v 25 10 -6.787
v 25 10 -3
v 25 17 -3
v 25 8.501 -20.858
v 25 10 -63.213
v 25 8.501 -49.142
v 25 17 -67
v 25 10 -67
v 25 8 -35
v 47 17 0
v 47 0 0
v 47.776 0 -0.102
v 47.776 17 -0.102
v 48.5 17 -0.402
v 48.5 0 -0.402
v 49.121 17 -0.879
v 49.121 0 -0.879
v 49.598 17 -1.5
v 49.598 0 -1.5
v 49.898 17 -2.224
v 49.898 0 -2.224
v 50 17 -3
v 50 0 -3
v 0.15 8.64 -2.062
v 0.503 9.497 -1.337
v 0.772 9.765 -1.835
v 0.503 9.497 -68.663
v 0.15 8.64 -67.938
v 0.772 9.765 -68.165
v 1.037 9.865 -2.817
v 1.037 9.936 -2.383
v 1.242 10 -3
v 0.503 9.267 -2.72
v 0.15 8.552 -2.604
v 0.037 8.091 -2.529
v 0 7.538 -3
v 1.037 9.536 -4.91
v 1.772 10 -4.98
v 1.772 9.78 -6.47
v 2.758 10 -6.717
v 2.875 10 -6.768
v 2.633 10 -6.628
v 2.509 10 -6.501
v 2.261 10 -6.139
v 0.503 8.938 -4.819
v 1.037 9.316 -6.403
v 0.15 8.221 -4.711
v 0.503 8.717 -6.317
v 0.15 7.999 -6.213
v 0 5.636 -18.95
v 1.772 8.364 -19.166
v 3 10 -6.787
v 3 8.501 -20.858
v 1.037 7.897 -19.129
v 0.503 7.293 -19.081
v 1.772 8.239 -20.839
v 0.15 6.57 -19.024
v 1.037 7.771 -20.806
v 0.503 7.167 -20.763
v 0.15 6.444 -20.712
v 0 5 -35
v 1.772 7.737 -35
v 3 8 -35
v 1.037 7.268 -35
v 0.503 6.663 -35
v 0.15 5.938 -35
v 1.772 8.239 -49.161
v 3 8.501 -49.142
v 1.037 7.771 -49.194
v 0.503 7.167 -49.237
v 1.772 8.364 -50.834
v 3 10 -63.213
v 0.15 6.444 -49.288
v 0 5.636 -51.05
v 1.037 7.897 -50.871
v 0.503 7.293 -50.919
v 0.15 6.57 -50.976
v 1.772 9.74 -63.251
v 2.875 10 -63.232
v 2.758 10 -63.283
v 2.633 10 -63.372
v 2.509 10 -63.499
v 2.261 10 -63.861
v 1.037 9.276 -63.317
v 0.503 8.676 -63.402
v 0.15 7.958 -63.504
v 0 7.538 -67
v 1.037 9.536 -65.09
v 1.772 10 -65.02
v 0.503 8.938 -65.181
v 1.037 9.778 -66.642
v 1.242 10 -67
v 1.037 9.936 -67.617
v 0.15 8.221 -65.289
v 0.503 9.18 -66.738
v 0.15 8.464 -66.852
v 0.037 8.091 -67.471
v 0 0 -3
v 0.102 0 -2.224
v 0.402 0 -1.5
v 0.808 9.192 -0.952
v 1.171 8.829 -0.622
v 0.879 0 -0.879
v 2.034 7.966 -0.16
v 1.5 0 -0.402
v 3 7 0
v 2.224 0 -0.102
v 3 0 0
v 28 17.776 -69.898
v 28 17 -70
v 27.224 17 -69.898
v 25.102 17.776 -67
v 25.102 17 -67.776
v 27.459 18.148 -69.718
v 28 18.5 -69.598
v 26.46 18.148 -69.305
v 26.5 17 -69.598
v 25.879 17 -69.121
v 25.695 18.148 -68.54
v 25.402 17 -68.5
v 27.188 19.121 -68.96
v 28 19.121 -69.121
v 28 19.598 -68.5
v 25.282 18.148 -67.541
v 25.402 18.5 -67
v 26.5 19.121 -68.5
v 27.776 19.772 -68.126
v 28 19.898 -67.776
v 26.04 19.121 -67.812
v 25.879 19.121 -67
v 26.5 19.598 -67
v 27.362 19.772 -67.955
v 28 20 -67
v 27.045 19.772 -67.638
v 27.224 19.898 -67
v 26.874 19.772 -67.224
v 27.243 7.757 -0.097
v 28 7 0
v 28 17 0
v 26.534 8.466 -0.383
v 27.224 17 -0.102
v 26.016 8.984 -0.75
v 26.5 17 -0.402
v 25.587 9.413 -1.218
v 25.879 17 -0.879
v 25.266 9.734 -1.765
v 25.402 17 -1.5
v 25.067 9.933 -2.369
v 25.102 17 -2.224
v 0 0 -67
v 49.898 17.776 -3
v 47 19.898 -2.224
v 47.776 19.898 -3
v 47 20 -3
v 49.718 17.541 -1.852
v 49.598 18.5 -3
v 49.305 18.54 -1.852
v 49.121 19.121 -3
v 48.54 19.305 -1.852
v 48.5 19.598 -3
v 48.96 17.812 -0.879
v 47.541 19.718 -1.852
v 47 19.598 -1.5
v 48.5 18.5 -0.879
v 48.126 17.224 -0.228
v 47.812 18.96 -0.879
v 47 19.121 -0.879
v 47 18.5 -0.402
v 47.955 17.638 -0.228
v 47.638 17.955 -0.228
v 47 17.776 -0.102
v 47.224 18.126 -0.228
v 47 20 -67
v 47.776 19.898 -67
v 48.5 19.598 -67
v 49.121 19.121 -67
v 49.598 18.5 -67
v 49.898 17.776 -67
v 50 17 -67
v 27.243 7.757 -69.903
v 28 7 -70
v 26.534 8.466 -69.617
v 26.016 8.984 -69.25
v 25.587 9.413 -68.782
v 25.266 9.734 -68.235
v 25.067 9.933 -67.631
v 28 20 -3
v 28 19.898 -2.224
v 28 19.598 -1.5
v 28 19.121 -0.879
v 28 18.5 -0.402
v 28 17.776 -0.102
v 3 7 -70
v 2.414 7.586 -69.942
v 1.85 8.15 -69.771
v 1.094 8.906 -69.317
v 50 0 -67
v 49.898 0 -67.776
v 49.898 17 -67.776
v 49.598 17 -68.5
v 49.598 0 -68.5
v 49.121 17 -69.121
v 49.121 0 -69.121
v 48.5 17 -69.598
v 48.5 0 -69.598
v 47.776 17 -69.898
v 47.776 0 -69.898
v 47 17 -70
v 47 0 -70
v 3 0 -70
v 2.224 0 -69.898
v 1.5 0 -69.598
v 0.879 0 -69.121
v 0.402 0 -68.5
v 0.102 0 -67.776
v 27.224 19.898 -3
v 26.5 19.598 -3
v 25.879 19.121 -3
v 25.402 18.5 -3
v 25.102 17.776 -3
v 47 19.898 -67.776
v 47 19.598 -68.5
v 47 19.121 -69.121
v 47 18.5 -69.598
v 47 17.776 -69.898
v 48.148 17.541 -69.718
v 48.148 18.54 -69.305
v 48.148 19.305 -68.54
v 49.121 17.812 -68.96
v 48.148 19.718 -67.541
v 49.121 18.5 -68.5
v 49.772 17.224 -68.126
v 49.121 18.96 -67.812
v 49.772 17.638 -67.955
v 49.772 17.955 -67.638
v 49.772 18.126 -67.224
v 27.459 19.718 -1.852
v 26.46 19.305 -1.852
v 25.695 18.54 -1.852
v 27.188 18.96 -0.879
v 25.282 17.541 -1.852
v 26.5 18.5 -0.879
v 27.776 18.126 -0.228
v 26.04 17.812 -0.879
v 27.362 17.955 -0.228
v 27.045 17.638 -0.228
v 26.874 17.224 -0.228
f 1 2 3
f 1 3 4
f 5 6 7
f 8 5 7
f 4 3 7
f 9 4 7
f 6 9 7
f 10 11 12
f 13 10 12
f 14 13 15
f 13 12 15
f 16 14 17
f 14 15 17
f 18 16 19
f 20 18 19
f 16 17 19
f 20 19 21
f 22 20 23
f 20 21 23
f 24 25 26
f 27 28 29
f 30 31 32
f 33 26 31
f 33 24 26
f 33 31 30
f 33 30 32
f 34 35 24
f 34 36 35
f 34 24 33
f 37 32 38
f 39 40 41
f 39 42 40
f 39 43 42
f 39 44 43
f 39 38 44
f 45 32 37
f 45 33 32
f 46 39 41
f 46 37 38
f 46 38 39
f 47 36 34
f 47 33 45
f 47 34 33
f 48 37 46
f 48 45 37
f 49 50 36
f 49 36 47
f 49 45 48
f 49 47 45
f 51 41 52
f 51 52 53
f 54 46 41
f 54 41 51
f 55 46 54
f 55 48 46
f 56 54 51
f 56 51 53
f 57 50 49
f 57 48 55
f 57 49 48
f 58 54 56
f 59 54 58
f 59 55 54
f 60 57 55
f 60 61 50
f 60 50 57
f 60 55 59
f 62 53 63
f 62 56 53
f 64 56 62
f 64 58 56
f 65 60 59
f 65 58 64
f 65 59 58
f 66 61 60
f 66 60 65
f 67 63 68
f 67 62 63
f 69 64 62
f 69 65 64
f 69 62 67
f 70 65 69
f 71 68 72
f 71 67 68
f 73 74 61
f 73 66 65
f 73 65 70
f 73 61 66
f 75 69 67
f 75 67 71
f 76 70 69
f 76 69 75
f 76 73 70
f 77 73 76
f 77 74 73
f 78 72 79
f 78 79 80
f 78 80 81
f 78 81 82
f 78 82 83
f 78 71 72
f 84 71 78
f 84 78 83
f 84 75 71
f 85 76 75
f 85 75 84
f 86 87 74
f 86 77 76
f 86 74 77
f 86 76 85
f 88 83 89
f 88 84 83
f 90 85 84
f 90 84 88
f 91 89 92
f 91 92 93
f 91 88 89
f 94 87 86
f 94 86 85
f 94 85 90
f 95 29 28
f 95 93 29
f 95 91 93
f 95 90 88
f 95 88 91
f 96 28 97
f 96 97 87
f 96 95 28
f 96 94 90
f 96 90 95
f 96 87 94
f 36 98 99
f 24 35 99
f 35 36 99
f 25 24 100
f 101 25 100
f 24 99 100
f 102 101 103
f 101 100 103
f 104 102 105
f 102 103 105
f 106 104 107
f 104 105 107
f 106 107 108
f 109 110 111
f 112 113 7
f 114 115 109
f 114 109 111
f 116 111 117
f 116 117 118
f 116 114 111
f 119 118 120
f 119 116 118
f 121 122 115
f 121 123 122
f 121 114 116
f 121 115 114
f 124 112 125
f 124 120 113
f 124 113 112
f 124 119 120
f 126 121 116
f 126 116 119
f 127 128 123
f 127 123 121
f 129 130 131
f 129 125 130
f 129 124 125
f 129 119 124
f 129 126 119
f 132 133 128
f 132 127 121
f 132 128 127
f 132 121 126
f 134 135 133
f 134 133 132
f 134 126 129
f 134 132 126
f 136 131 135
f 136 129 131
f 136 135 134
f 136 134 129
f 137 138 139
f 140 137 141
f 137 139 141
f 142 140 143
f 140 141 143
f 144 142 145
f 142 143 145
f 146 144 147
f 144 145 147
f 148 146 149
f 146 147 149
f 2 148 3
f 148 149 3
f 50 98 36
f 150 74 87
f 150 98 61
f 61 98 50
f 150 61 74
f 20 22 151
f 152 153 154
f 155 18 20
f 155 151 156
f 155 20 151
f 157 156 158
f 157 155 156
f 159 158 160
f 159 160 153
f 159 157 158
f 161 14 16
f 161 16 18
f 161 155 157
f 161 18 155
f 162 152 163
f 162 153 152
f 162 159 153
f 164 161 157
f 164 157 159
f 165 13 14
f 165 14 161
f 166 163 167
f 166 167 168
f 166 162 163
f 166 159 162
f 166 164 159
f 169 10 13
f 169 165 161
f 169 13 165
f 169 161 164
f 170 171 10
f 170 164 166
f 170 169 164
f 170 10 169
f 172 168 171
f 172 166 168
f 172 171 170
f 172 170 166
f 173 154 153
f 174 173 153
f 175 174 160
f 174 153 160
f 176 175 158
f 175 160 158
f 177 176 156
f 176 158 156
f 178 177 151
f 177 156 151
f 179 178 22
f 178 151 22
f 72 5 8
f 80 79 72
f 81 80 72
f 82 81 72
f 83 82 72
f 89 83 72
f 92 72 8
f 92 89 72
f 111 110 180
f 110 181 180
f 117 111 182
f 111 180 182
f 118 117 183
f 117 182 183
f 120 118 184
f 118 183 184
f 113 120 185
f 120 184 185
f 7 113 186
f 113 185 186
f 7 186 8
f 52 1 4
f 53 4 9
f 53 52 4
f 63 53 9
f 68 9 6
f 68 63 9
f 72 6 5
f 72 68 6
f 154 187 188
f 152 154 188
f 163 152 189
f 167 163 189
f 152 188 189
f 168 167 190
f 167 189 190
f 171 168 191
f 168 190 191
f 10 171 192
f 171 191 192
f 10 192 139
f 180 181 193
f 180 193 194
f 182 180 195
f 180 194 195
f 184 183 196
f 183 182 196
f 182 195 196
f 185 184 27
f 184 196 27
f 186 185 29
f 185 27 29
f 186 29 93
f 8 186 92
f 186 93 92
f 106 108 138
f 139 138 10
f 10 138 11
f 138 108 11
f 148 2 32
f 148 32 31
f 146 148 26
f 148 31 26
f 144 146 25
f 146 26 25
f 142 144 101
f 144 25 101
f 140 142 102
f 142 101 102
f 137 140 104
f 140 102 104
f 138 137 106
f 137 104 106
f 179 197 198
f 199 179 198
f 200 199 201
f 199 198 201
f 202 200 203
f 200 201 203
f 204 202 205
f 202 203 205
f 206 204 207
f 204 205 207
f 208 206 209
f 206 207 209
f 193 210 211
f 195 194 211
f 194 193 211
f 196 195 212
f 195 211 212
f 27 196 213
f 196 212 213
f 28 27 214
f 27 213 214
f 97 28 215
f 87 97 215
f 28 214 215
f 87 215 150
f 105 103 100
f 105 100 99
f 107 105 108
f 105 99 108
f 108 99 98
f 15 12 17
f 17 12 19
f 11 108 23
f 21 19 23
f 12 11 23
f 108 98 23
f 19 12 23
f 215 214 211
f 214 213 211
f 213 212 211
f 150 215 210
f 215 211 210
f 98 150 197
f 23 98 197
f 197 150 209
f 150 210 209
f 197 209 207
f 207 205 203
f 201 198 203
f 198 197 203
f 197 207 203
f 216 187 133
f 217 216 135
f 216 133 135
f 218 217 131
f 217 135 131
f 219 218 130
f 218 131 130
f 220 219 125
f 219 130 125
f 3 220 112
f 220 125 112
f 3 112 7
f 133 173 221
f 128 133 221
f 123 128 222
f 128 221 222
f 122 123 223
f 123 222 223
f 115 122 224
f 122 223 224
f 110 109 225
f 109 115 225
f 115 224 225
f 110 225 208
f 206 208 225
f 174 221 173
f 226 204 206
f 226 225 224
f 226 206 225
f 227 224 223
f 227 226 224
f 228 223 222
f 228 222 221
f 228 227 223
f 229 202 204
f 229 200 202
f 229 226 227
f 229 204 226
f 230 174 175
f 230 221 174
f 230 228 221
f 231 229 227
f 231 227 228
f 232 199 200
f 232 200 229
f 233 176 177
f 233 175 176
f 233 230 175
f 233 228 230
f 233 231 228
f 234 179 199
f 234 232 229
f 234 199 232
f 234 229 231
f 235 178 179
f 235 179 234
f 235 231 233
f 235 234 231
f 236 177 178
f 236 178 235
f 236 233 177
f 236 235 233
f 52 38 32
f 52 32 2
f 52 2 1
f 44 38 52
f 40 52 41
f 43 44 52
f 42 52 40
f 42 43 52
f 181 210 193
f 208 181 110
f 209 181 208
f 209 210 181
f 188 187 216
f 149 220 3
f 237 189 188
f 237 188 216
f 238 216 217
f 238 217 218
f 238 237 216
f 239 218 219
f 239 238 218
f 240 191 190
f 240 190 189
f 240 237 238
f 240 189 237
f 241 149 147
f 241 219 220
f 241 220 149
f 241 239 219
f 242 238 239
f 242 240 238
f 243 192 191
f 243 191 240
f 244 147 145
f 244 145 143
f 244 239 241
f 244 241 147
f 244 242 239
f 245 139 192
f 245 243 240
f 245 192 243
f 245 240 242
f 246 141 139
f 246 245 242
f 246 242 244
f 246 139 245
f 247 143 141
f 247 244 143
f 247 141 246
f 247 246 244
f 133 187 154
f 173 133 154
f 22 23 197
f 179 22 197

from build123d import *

# Parameters (mm, degrees)
SKETCH1_W           = 50
SKETCH1_H           = 70
BOSS_EXTRUDE1_DEPTH = 20
CUT_EXTRUDE1_DEPTH  = 25
FILLET1_R           = 3


with BuildPart() as part:
    # Sketch1 → Boss-Extrude1 (new body)
    with BuildSketch(Plane(origin=(0, 0, 0), x_dir=(1, 0, 0), z_dir=(0, 1, 0))):
        with Locations((25, 35)):
            Rectangle(SKETCH1_W, SKETCH1_H)
    extrude(amount=BOSS_EXTRUDE1_DEPTH)

    # Sketch3 → Cut-Extrude1 (cut)
    with BuildSketch(Plane.ZY):
        with BuildLine():
            Line((-70, 20), (0, 20))
            Line((0, 20), (0, 10))
            Line((0, 10), (-6.786528041, 10))
            ThreePointArc((-6.786528041, 10), (-35, 8), (-63.213471959, 10))
            Line((-63.213471959, 10), (-70, 10))
            Line((-70, 10), (-70, 20))
        make_face()
    extrude(amount=-CUT_EXTRUDE1_DEPTH, mode=Mode.SUBTRACT)

    # Fillet1
    # the kernel refuses this fillet: 3 mm, written as the material it takes off along each edge
    with BuildSketch(Plane(origin=(28, 17, -67), x_dir=(-1, 0, 0), z_dir=(0, 1, 0))) as fillet1_piece_1_section:
        Polygon((0, 0), (FILLET1_R, 0), (FILLET1_R, -FILLET1_R), (0, -FILLET1_R), align=None)
    fillet1_piece_1 = extrude(amount=FILLET1_R, mode=Mode.PRIVATE)
    fillet1_piece_1 = fillet1_piece_1 - Plane(origin=(28, 17, -67), x_dir=(0.7071067811865475, 0, 0.7071067811865475), z_dir=(0, 1, 0)) * Sphere(FILLET1_R, mode=Mode.PRIVATE)
    add(fillet1_piece_1, mode=Mode.SUBTRACT)
    with BuildSketch(Plane(origin=(28, 17, -3), x_dir=(0, 1, 0), z_dir=(0, 0, 1))) as fillet1_piece_2_section:
        Polygon((0, 0), (FILLET1_R, 0), (FILLET1_R, FILLET1_R), (0, FILLET1_R), align=None)
    fillet1_piece_2 = extrude(amount=FILLET1_R, mode=Mode.PRIVATE)
    fillet1_piece_2 = fillet1_piece_2 - Plane(origin=(28, 17, -3), x_dir=(0.7071067811865475, -0.7071067811865475, 0), z_dir=(0, 0, 1)) * Sphere(FILLET1_R, mode=Mode.PRIVATE)
    add(fillet1_piece_2, mode=Mode.SUBTRACT)
    with BuildSketch(Plane(origin=(47, 17, -67), x_dir=(0, 1, 0), z_dir=(1, 0, 0))) as fillet1_piece_3_section:
        Polygon((0, 0), (FILLET1_R, 0), (FILLET1_R, -FILLET1_R), (0, -FILLET1_R), align=None)
    fillet1_piece_3 = extrude(amount=FILLET1_R, mode=Mode.PRIVATE)
    fillet1_piece_3 = fillet1_piece_3 - Plane(origin=(47, 17, -67), x_dir=(0, -0.7071067811865475, 0.7071067811865475), z_dir=(1, 0, 0)) * Sphere(FILLET1_R, mode=Mode.PRIVATE)
    add(fillet1_piece_3, mode=Mode.SUBTRACT)
    with BuildSketch(Plane(origin=(47, 17, -3), x_dir=(1, 0, 0), z_dir=(0, 0, 1))) as fillet1_piece_4_section:
        Polygon((0, 0), (FILLET1_R, 0), (FILLET1_R, FILLET1_R), (0, FILLET1_R), align=None)
    fillet1_piece_4 = extrude(amount=FILLET1_R, mode=Mode.PRIVATE)
    fillet1_piece_4 = fillet1_piece_4 - Plane(origin=(47, 17, -3), x_dir=(-0.7071067811865475, -0.7071067811865475, 0), z_dir=(0, 0, 1)) * Sphere(FILLET1_R, mode=Mode.PRIVATE)
    add(fillet1_piece_4, mode=Mode.SUBTRACT)
    with BuildSketch(Plane(origin=(25, 10, -70), x_dir=(0, 0, 1), z_dir=(0, 1, 0))) as fillet1_piece_5:
        with BuildLine():
            CenterArc((FILLET1_R, FILLET1_R), FILLET1_R, 180, 90)
            Line((0, FILLET1_R), (0, 0))
            Line((0, 0), (FILLET1_R, 0))
        make_face()
    extrude(amount=7, mode=Mode.SUBTRACT)
    with BuildSketch(Plane(origin=(25, 17, 0), x_dir=(1, 0, 0), z_dir=(0, -1, 0))) as fillet1_piece_6:
        with BuildLine():
            CenterArc((FILLET1_R, -FILLET1_R), FILLET1_R, 90, 90)
            Line((0, -FILLET1_R), (0, 0))
            Line((0, 0), (FILLET1_R, 0))
        make_face()
    extrude(amount=7, mode=Mode.SUBTRACT)
    with BuildSketch(Plane(origin=(-7.5, 10, -70), x_dir=(0, -1, 0), z_dir=(1, 0, 0))) as fillet1_piece_7:
        with BuildLine():
            CenterArc((FILLET1_R, -FILLET1_R), FILLET1_R, 90, 90)
            Line((0, -FILLET1_R), (0, 0))
            Line((0, 0), (FILLET1_R, 0))
        make_face()
    extrude(amount=32.5, mode=Mode.SUBTRACT)
    with BuildSketch(Plane(origin=(0, 208, -35), x_dir=(0, -0.9840151144884159, 0.17808496415573608), z_dir=(0, 0.17808496415573608, 0.9840151144884159))) as fillet1_piece_8:
        with BuildLine():
            CenterArc((200 + FILLET1_R, FILLET1_R), FILLET1_R, 180, 90)
            Line((200, FILLET1_R), (200, 0))
            Line((200, 0), (200 + FILLET1_R, 0))
        make_face()
    revolve(axis=Axis((0, 208, -35), (1, 0, 0)), revolution_arc=20.516468422, mode=Mode.SUBTRACT)
    with BuildSketch(Plane(origin=(-7.5, 10, 0), x_dir=(0, -1, 0), z_dir=(1, 0, 0))) as fillet1_piece_9:
        with BuildLine():
            CenterArc((FILLET1_R, FILLET1_R), FILLET1_R, 180, 90)
            Line((0, FILLET1_R), (0, 0))
            Line((0, 0), (FILLET1_R, 0))
        make_face()
    extrude(amount=32.5, mode=Mode.SUBTRACT)
    with BuildSketch(Plane(origin=(47, 20, -70), x_dir=(0, 0, 1), z_dir=(-1, 0, 0))) as fillet1_piece_10:
        with BuildLine():
            CenterArc((FILLET1_R, -FILLET1_R), FILLET1_R, 90, 90)
            Line((0, -FILLET1_R), (0, 0))
            Line((0, 0), (FILLET1_R, 0))
        make_face()
    extrude(amount=19, mode=Mode.SUBTRACT)
    with BuildSketch(Plane(origin=(50, 20, -3), x_dir=(0, -1, 0), z_dir=(0, 0, -1))) as fillet1_piece_11:
        with BuildLine():
            CenterArc((FILLET1_R, FILLET1_R), FILLET1_R, 180, 90)
            Line((0, FILLET1_R), (0, 0))
            Line((0, 0), (FILLET1_R, 0))
        make_face()
    extrude(amount=64, mode=Mode.SUBTRACT)
    with BuildSketch(Plane(origin=(28, 20, 0), x_dir=(0, -1, 0), z_dir=(1, 0, 0))) as fillet1_piece_12:
        with BuildLine():
            CenterArc((FILLET1_R, FILLET1_R), FILLET1_R, 180, 90)
            Line((0, FILLET1_R), (0, 0))
            Line((0, 0), (FILLET1_R, 0))
        make_face()
    extrude(amount=19, mode=Mode.SUBTRACT)
    with BuildSketch(Plane(origin=(25, 20, -67), x_dir=(1, 0, 0), z_dir=(0, 0, 1))) as fillet1_piece_13:
        with BuildLine():
            CenterArc((FILLET1_R, -FILLET1_R), FILLET1_R, 90, 90)
            Line((0, -FILLET1_R), (0, 0))
            Line((0, 0), (FILLET1_R, 0))
        make_face()
    extrude(amount=64, mode=Mode.SUBTRACT)
    with BuildSketch(Plane(origin=(0, -7.5, 0), x_dir=(1, 0, 0), z_dir=(0, 1, 0)), Plane(origin=(0, -7.5, -70), x_dir=(0, 0, 1), z_dir=(0, 1, 0))) as fillet1_piece_14:
        with BuildLine():
            CenterArc((FILLET1_R, FILLET1_R), FILLET1_R, 180, 90)
            Line((0, FILLET1_R), (0, 0))
            Line((0, 0), (FILLET1_R, 0))
        make_face()
    extrude(amount=25, mode=Mode.SUBTRACT)
    with BuildSketch(Plane(origin=(50, -7.5, -70), x_dir=(0, 0, 1), z_dir=(0, 1, 0)), Plane(origin=(50, -7.5, 0), x_dir=(-1, 0, 0), z_dir=(0, 1, 0))) as fillet1_piece_15:
        with BuildLine():
            CenterArc((FILLET1_R, -FILLET1_R), FILLET1_R, 90, 90)
            Line((0, -FILLET1_R), (0, 0))
            Line((0, 0), (FILLET1_R, 0))
        make_face()
    extrude(amount=24.5, mode=Mode.SUBTRACT)
    with BuildSketch(Plane(origin=(25, 2.5, -70), x_dir=(0, 0, 1), z_dir=(0, 1, 0))) as fillet1_piece_16a_section:
        with BuildLine():
            CenterArc((FILLET1_R, FILLET1_R), FILLET1_R, 180, 90)
            Line((0, FILLET1_R), (0, 0))
            Line((0, 0), (FILLET1_R, 0))
        make_face()
    fillet1_piece_16a = extrude(amount=14.5, mode=Mode.PRIVATE)
    fillet1_piece_16a = split(fillet1_piece_16a, bisect_by=Plane(origin=(25.679185343, 10, -69.320814657), z_dir=(0, -1, 0)), keep=Keep.TOP, mode=Mode.PRIVATE)
    with BuildSketch(Plane(origin=(-7.5, 10, -70), x_dir=(0, -1, 0), z_dir=(1, 0, 0))) as fillet1_piece_16b_section:
        with BuildLine():
            CenterArc((FILLET1_R, -FILLET1_R), FILLET1_R, 90, 90)
            Line((0, -FILLET1_R), (0, 0))
            Line((0, 0), (FILLET1_R, 0))
        make_face()
    fillet1_piece_16b = extrude(amount=40, mode=Mode.PRIVATE)
    fillet1_piece_16b = split(fillet1_piece_16b, bisect_by=Plane(origin=(25, 9.320814657, -69.320814657), z_dir=(1, 0, 0)), keep=Keep.TOP, mode=Mode.PRIVATE)
    fillet1_piece_16 = fillet1_piece_16a & fillet1_piece_16b
    add(fillet1_piece_16, mode=Mode.SUBTRACT)
    with BuildSketch(Plane(origin=(25, 17, 0), x_dir=(1, 0, 0), z_dir=(0, -1, 0))) as fillet1_piece_17a_section:
        with BuildLine():
            CenterArc((FILLET1_R, -FILLET1_R), FILLET1_R, 90, 90)
            Line((0, -FILLET1_R), (0, 0))
            Line((0, 0), (FILLET1_R, 0))
        make_face()
    fillet1_piece_17a = extrude(amount=14.5, mode=Mode.PRIVATE)
    fillet1_piece_17a = split(fillet1_piece_17a, bisect_by=Plane(origin=(25.679185343, 10, -0.679185343), z_dir=(0, -1, 0)), keep=Keep.TOP, mode=Mode.PRIVATE)
    with BuildSketch(Plane(origin=(-7.5, 10, 0), x_dir=(0, -1, 0), z_dir=(1, 0, 0))) as fillet1_piece_17b_section:
        with BuildLine():
            CenterArc((FILLET1_R, FILLET1_R), FILLET1_R, 180, 90)
            Line((0, FILLET1_R), (0, 0))
            Line((0, 0), (FILLET1_R, 0))
        make_face()
    fillet1_piece_17b = extrude(amount=40, mode=Mode.PRIVATE)
    fillet1_piece_17b = split(fillet1_piece_17b, bisect_by=Plane(origin=(25, 9.320814657, -0.679185343), z_dir=(1, 0, 0)), keep=Keep.TOP, mode=Mode.PRIVATE)
    fillet1_piece_17 = fillet1_piece_17a & fillet1_piece_17b
    add(fillet1_piece_17, mode=Mode.SUBTRACT)


solid = part.part
